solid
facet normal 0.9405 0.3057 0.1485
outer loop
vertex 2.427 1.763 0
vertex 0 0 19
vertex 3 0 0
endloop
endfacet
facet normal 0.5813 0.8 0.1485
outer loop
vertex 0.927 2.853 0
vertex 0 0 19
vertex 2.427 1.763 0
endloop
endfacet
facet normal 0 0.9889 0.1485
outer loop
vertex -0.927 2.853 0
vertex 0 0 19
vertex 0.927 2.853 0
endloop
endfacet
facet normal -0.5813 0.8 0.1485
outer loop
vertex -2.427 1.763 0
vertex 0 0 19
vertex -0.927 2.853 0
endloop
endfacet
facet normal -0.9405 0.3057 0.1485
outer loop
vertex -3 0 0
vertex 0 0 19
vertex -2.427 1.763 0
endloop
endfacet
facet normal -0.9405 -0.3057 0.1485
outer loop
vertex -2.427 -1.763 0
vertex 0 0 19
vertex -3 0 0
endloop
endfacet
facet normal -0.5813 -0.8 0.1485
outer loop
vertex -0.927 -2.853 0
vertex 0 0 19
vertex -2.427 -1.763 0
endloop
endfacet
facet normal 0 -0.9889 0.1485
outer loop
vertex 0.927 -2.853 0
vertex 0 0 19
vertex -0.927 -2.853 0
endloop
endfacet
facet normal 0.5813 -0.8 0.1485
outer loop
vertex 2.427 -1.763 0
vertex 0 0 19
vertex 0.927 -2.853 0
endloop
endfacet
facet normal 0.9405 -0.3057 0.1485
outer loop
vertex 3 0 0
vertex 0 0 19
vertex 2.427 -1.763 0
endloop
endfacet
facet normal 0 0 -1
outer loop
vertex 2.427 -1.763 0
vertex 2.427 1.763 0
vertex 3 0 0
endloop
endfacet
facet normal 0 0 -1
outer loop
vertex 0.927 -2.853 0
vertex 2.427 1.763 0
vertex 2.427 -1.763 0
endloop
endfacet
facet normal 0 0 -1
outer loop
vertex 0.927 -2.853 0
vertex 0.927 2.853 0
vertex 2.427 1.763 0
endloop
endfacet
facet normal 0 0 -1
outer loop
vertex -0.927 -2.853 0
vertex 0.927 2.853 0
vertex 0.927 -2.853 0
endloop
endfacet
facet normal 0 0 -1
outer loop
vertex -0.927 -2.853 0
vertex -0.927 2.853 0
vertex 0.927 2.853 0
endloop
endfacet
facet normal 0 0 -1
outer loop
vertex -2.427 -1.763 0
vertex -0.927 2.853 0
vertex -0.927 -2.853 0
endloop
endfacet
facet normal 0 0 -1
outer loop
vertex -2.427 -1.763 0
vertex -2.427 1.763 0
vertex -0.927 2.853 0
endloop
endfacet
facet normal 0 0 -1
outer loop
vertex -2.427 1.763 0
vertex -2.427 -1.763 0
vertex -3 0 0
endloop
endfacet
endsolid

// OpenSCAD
// Generated by SolidPython 1.0.1 on 2020-07-29 00:46:43


cylinder(h = 19, r1 = 3, r2 = 0);
/***********************************************
*********      SolidPython code:      **********
************************************************
 
# import packages: SolidPython
from solid import *
from solid.utils import *
from itertools import chain, combinations, permutations


class Resize:

    def __init__(self, scad_file):
        self.scad_file = scad_file
        #self.scad_file = import_scad(scad_file)
        # cone/cylinder param:
        self.r1 = 0
        self.r2 = 0
        self.h = 0
        # rectangular prism param:
        self.w = 0
        self.l = 0
        # ellipse param:
        self.r = 0

    # import OpenScad code (file name corresponds to shape)


    # classify shape + parameters
    def assign(self, param1, param2, param3):
        if self.scad_file == 'cone.scad':
            self.r1 = param1
            self.r2 = param2
            self.h = param3
        elif self.scad_file == 'cylinder.scad':
            self.r1 = param1
            self.r2 = param2
            self.h = param3
        elif self.scad_file == 'rectangularPrism.scad':
            self.h = param1
            self.l = param2
            self.w = param3
        else:
            self.r = param1
            self.h = param2

    # resize parameters
    def iterate(self):
        x = range(3, 20, 2)
        i = 1
        if self.scad_file == 'cone.scad':
            tempList = list(permutations(x, 2))
            for temp in tempList:
                param1 = temp[0]
                param2 = temp[1]
                filepath = 'produced_scad_files/' + 'cone' + str(param1) + '_' + str(param2) + '_' + '.scad'
                scad_render_to_file(cylinder(h=param1, r1=param2, r2=0), filepath)

        elif self.scad_file == 'cylinder.scad':
            tempList = list(permutations(x, 3))
            for temp in tempList:
                param1 = temp[0]
                param2 = temp[1]
                filepath = 'produced_scad_files/' + 'cylinder' + str(param1) + '_' + str(param2) + '_' + '.scad'
                scad_render_to_file(cylinder(h=param1, r1=param2, r2=param2), filepath)

        elif self.scad_file == 'rectangularPrism.scad':
            tempList = list(permutations(x, 3))
            for temp in tempList:
                param1 = temp[0]
                param2 = temp[1]
                param3 = temp[2]
                filepath = 'produced_scad_files/' + 'rectangularPrism' + str(param1) + '_' + str(param2) + '_' + str(
                    param3) + '.scad'
                scad_render_to_file(cube(size=(param1, param2, param3)), filepath)

        elif self.scad_file == 'ellipse.scad':
            tempList = list(permutations(x, 4))
            for temp in tempList:
                param1 = temp[0]
                param2 = temp[1]
                param3 = temp[2]
                param4 = temp[3]
                filepath = 'produced_scad_files/' + 'ellipse' + str(param1) + '_' + str(param2) + '_' + str(param3) + '_' + str(param4) + '.scad'
                scad_render_to_file(scale([param1, param2, param3])(sphere(r=param4)), filepath)

    def render_to_scadfile(self):
        scad_render_to_file(scad, 'example.scad') 
 
************************************************/
